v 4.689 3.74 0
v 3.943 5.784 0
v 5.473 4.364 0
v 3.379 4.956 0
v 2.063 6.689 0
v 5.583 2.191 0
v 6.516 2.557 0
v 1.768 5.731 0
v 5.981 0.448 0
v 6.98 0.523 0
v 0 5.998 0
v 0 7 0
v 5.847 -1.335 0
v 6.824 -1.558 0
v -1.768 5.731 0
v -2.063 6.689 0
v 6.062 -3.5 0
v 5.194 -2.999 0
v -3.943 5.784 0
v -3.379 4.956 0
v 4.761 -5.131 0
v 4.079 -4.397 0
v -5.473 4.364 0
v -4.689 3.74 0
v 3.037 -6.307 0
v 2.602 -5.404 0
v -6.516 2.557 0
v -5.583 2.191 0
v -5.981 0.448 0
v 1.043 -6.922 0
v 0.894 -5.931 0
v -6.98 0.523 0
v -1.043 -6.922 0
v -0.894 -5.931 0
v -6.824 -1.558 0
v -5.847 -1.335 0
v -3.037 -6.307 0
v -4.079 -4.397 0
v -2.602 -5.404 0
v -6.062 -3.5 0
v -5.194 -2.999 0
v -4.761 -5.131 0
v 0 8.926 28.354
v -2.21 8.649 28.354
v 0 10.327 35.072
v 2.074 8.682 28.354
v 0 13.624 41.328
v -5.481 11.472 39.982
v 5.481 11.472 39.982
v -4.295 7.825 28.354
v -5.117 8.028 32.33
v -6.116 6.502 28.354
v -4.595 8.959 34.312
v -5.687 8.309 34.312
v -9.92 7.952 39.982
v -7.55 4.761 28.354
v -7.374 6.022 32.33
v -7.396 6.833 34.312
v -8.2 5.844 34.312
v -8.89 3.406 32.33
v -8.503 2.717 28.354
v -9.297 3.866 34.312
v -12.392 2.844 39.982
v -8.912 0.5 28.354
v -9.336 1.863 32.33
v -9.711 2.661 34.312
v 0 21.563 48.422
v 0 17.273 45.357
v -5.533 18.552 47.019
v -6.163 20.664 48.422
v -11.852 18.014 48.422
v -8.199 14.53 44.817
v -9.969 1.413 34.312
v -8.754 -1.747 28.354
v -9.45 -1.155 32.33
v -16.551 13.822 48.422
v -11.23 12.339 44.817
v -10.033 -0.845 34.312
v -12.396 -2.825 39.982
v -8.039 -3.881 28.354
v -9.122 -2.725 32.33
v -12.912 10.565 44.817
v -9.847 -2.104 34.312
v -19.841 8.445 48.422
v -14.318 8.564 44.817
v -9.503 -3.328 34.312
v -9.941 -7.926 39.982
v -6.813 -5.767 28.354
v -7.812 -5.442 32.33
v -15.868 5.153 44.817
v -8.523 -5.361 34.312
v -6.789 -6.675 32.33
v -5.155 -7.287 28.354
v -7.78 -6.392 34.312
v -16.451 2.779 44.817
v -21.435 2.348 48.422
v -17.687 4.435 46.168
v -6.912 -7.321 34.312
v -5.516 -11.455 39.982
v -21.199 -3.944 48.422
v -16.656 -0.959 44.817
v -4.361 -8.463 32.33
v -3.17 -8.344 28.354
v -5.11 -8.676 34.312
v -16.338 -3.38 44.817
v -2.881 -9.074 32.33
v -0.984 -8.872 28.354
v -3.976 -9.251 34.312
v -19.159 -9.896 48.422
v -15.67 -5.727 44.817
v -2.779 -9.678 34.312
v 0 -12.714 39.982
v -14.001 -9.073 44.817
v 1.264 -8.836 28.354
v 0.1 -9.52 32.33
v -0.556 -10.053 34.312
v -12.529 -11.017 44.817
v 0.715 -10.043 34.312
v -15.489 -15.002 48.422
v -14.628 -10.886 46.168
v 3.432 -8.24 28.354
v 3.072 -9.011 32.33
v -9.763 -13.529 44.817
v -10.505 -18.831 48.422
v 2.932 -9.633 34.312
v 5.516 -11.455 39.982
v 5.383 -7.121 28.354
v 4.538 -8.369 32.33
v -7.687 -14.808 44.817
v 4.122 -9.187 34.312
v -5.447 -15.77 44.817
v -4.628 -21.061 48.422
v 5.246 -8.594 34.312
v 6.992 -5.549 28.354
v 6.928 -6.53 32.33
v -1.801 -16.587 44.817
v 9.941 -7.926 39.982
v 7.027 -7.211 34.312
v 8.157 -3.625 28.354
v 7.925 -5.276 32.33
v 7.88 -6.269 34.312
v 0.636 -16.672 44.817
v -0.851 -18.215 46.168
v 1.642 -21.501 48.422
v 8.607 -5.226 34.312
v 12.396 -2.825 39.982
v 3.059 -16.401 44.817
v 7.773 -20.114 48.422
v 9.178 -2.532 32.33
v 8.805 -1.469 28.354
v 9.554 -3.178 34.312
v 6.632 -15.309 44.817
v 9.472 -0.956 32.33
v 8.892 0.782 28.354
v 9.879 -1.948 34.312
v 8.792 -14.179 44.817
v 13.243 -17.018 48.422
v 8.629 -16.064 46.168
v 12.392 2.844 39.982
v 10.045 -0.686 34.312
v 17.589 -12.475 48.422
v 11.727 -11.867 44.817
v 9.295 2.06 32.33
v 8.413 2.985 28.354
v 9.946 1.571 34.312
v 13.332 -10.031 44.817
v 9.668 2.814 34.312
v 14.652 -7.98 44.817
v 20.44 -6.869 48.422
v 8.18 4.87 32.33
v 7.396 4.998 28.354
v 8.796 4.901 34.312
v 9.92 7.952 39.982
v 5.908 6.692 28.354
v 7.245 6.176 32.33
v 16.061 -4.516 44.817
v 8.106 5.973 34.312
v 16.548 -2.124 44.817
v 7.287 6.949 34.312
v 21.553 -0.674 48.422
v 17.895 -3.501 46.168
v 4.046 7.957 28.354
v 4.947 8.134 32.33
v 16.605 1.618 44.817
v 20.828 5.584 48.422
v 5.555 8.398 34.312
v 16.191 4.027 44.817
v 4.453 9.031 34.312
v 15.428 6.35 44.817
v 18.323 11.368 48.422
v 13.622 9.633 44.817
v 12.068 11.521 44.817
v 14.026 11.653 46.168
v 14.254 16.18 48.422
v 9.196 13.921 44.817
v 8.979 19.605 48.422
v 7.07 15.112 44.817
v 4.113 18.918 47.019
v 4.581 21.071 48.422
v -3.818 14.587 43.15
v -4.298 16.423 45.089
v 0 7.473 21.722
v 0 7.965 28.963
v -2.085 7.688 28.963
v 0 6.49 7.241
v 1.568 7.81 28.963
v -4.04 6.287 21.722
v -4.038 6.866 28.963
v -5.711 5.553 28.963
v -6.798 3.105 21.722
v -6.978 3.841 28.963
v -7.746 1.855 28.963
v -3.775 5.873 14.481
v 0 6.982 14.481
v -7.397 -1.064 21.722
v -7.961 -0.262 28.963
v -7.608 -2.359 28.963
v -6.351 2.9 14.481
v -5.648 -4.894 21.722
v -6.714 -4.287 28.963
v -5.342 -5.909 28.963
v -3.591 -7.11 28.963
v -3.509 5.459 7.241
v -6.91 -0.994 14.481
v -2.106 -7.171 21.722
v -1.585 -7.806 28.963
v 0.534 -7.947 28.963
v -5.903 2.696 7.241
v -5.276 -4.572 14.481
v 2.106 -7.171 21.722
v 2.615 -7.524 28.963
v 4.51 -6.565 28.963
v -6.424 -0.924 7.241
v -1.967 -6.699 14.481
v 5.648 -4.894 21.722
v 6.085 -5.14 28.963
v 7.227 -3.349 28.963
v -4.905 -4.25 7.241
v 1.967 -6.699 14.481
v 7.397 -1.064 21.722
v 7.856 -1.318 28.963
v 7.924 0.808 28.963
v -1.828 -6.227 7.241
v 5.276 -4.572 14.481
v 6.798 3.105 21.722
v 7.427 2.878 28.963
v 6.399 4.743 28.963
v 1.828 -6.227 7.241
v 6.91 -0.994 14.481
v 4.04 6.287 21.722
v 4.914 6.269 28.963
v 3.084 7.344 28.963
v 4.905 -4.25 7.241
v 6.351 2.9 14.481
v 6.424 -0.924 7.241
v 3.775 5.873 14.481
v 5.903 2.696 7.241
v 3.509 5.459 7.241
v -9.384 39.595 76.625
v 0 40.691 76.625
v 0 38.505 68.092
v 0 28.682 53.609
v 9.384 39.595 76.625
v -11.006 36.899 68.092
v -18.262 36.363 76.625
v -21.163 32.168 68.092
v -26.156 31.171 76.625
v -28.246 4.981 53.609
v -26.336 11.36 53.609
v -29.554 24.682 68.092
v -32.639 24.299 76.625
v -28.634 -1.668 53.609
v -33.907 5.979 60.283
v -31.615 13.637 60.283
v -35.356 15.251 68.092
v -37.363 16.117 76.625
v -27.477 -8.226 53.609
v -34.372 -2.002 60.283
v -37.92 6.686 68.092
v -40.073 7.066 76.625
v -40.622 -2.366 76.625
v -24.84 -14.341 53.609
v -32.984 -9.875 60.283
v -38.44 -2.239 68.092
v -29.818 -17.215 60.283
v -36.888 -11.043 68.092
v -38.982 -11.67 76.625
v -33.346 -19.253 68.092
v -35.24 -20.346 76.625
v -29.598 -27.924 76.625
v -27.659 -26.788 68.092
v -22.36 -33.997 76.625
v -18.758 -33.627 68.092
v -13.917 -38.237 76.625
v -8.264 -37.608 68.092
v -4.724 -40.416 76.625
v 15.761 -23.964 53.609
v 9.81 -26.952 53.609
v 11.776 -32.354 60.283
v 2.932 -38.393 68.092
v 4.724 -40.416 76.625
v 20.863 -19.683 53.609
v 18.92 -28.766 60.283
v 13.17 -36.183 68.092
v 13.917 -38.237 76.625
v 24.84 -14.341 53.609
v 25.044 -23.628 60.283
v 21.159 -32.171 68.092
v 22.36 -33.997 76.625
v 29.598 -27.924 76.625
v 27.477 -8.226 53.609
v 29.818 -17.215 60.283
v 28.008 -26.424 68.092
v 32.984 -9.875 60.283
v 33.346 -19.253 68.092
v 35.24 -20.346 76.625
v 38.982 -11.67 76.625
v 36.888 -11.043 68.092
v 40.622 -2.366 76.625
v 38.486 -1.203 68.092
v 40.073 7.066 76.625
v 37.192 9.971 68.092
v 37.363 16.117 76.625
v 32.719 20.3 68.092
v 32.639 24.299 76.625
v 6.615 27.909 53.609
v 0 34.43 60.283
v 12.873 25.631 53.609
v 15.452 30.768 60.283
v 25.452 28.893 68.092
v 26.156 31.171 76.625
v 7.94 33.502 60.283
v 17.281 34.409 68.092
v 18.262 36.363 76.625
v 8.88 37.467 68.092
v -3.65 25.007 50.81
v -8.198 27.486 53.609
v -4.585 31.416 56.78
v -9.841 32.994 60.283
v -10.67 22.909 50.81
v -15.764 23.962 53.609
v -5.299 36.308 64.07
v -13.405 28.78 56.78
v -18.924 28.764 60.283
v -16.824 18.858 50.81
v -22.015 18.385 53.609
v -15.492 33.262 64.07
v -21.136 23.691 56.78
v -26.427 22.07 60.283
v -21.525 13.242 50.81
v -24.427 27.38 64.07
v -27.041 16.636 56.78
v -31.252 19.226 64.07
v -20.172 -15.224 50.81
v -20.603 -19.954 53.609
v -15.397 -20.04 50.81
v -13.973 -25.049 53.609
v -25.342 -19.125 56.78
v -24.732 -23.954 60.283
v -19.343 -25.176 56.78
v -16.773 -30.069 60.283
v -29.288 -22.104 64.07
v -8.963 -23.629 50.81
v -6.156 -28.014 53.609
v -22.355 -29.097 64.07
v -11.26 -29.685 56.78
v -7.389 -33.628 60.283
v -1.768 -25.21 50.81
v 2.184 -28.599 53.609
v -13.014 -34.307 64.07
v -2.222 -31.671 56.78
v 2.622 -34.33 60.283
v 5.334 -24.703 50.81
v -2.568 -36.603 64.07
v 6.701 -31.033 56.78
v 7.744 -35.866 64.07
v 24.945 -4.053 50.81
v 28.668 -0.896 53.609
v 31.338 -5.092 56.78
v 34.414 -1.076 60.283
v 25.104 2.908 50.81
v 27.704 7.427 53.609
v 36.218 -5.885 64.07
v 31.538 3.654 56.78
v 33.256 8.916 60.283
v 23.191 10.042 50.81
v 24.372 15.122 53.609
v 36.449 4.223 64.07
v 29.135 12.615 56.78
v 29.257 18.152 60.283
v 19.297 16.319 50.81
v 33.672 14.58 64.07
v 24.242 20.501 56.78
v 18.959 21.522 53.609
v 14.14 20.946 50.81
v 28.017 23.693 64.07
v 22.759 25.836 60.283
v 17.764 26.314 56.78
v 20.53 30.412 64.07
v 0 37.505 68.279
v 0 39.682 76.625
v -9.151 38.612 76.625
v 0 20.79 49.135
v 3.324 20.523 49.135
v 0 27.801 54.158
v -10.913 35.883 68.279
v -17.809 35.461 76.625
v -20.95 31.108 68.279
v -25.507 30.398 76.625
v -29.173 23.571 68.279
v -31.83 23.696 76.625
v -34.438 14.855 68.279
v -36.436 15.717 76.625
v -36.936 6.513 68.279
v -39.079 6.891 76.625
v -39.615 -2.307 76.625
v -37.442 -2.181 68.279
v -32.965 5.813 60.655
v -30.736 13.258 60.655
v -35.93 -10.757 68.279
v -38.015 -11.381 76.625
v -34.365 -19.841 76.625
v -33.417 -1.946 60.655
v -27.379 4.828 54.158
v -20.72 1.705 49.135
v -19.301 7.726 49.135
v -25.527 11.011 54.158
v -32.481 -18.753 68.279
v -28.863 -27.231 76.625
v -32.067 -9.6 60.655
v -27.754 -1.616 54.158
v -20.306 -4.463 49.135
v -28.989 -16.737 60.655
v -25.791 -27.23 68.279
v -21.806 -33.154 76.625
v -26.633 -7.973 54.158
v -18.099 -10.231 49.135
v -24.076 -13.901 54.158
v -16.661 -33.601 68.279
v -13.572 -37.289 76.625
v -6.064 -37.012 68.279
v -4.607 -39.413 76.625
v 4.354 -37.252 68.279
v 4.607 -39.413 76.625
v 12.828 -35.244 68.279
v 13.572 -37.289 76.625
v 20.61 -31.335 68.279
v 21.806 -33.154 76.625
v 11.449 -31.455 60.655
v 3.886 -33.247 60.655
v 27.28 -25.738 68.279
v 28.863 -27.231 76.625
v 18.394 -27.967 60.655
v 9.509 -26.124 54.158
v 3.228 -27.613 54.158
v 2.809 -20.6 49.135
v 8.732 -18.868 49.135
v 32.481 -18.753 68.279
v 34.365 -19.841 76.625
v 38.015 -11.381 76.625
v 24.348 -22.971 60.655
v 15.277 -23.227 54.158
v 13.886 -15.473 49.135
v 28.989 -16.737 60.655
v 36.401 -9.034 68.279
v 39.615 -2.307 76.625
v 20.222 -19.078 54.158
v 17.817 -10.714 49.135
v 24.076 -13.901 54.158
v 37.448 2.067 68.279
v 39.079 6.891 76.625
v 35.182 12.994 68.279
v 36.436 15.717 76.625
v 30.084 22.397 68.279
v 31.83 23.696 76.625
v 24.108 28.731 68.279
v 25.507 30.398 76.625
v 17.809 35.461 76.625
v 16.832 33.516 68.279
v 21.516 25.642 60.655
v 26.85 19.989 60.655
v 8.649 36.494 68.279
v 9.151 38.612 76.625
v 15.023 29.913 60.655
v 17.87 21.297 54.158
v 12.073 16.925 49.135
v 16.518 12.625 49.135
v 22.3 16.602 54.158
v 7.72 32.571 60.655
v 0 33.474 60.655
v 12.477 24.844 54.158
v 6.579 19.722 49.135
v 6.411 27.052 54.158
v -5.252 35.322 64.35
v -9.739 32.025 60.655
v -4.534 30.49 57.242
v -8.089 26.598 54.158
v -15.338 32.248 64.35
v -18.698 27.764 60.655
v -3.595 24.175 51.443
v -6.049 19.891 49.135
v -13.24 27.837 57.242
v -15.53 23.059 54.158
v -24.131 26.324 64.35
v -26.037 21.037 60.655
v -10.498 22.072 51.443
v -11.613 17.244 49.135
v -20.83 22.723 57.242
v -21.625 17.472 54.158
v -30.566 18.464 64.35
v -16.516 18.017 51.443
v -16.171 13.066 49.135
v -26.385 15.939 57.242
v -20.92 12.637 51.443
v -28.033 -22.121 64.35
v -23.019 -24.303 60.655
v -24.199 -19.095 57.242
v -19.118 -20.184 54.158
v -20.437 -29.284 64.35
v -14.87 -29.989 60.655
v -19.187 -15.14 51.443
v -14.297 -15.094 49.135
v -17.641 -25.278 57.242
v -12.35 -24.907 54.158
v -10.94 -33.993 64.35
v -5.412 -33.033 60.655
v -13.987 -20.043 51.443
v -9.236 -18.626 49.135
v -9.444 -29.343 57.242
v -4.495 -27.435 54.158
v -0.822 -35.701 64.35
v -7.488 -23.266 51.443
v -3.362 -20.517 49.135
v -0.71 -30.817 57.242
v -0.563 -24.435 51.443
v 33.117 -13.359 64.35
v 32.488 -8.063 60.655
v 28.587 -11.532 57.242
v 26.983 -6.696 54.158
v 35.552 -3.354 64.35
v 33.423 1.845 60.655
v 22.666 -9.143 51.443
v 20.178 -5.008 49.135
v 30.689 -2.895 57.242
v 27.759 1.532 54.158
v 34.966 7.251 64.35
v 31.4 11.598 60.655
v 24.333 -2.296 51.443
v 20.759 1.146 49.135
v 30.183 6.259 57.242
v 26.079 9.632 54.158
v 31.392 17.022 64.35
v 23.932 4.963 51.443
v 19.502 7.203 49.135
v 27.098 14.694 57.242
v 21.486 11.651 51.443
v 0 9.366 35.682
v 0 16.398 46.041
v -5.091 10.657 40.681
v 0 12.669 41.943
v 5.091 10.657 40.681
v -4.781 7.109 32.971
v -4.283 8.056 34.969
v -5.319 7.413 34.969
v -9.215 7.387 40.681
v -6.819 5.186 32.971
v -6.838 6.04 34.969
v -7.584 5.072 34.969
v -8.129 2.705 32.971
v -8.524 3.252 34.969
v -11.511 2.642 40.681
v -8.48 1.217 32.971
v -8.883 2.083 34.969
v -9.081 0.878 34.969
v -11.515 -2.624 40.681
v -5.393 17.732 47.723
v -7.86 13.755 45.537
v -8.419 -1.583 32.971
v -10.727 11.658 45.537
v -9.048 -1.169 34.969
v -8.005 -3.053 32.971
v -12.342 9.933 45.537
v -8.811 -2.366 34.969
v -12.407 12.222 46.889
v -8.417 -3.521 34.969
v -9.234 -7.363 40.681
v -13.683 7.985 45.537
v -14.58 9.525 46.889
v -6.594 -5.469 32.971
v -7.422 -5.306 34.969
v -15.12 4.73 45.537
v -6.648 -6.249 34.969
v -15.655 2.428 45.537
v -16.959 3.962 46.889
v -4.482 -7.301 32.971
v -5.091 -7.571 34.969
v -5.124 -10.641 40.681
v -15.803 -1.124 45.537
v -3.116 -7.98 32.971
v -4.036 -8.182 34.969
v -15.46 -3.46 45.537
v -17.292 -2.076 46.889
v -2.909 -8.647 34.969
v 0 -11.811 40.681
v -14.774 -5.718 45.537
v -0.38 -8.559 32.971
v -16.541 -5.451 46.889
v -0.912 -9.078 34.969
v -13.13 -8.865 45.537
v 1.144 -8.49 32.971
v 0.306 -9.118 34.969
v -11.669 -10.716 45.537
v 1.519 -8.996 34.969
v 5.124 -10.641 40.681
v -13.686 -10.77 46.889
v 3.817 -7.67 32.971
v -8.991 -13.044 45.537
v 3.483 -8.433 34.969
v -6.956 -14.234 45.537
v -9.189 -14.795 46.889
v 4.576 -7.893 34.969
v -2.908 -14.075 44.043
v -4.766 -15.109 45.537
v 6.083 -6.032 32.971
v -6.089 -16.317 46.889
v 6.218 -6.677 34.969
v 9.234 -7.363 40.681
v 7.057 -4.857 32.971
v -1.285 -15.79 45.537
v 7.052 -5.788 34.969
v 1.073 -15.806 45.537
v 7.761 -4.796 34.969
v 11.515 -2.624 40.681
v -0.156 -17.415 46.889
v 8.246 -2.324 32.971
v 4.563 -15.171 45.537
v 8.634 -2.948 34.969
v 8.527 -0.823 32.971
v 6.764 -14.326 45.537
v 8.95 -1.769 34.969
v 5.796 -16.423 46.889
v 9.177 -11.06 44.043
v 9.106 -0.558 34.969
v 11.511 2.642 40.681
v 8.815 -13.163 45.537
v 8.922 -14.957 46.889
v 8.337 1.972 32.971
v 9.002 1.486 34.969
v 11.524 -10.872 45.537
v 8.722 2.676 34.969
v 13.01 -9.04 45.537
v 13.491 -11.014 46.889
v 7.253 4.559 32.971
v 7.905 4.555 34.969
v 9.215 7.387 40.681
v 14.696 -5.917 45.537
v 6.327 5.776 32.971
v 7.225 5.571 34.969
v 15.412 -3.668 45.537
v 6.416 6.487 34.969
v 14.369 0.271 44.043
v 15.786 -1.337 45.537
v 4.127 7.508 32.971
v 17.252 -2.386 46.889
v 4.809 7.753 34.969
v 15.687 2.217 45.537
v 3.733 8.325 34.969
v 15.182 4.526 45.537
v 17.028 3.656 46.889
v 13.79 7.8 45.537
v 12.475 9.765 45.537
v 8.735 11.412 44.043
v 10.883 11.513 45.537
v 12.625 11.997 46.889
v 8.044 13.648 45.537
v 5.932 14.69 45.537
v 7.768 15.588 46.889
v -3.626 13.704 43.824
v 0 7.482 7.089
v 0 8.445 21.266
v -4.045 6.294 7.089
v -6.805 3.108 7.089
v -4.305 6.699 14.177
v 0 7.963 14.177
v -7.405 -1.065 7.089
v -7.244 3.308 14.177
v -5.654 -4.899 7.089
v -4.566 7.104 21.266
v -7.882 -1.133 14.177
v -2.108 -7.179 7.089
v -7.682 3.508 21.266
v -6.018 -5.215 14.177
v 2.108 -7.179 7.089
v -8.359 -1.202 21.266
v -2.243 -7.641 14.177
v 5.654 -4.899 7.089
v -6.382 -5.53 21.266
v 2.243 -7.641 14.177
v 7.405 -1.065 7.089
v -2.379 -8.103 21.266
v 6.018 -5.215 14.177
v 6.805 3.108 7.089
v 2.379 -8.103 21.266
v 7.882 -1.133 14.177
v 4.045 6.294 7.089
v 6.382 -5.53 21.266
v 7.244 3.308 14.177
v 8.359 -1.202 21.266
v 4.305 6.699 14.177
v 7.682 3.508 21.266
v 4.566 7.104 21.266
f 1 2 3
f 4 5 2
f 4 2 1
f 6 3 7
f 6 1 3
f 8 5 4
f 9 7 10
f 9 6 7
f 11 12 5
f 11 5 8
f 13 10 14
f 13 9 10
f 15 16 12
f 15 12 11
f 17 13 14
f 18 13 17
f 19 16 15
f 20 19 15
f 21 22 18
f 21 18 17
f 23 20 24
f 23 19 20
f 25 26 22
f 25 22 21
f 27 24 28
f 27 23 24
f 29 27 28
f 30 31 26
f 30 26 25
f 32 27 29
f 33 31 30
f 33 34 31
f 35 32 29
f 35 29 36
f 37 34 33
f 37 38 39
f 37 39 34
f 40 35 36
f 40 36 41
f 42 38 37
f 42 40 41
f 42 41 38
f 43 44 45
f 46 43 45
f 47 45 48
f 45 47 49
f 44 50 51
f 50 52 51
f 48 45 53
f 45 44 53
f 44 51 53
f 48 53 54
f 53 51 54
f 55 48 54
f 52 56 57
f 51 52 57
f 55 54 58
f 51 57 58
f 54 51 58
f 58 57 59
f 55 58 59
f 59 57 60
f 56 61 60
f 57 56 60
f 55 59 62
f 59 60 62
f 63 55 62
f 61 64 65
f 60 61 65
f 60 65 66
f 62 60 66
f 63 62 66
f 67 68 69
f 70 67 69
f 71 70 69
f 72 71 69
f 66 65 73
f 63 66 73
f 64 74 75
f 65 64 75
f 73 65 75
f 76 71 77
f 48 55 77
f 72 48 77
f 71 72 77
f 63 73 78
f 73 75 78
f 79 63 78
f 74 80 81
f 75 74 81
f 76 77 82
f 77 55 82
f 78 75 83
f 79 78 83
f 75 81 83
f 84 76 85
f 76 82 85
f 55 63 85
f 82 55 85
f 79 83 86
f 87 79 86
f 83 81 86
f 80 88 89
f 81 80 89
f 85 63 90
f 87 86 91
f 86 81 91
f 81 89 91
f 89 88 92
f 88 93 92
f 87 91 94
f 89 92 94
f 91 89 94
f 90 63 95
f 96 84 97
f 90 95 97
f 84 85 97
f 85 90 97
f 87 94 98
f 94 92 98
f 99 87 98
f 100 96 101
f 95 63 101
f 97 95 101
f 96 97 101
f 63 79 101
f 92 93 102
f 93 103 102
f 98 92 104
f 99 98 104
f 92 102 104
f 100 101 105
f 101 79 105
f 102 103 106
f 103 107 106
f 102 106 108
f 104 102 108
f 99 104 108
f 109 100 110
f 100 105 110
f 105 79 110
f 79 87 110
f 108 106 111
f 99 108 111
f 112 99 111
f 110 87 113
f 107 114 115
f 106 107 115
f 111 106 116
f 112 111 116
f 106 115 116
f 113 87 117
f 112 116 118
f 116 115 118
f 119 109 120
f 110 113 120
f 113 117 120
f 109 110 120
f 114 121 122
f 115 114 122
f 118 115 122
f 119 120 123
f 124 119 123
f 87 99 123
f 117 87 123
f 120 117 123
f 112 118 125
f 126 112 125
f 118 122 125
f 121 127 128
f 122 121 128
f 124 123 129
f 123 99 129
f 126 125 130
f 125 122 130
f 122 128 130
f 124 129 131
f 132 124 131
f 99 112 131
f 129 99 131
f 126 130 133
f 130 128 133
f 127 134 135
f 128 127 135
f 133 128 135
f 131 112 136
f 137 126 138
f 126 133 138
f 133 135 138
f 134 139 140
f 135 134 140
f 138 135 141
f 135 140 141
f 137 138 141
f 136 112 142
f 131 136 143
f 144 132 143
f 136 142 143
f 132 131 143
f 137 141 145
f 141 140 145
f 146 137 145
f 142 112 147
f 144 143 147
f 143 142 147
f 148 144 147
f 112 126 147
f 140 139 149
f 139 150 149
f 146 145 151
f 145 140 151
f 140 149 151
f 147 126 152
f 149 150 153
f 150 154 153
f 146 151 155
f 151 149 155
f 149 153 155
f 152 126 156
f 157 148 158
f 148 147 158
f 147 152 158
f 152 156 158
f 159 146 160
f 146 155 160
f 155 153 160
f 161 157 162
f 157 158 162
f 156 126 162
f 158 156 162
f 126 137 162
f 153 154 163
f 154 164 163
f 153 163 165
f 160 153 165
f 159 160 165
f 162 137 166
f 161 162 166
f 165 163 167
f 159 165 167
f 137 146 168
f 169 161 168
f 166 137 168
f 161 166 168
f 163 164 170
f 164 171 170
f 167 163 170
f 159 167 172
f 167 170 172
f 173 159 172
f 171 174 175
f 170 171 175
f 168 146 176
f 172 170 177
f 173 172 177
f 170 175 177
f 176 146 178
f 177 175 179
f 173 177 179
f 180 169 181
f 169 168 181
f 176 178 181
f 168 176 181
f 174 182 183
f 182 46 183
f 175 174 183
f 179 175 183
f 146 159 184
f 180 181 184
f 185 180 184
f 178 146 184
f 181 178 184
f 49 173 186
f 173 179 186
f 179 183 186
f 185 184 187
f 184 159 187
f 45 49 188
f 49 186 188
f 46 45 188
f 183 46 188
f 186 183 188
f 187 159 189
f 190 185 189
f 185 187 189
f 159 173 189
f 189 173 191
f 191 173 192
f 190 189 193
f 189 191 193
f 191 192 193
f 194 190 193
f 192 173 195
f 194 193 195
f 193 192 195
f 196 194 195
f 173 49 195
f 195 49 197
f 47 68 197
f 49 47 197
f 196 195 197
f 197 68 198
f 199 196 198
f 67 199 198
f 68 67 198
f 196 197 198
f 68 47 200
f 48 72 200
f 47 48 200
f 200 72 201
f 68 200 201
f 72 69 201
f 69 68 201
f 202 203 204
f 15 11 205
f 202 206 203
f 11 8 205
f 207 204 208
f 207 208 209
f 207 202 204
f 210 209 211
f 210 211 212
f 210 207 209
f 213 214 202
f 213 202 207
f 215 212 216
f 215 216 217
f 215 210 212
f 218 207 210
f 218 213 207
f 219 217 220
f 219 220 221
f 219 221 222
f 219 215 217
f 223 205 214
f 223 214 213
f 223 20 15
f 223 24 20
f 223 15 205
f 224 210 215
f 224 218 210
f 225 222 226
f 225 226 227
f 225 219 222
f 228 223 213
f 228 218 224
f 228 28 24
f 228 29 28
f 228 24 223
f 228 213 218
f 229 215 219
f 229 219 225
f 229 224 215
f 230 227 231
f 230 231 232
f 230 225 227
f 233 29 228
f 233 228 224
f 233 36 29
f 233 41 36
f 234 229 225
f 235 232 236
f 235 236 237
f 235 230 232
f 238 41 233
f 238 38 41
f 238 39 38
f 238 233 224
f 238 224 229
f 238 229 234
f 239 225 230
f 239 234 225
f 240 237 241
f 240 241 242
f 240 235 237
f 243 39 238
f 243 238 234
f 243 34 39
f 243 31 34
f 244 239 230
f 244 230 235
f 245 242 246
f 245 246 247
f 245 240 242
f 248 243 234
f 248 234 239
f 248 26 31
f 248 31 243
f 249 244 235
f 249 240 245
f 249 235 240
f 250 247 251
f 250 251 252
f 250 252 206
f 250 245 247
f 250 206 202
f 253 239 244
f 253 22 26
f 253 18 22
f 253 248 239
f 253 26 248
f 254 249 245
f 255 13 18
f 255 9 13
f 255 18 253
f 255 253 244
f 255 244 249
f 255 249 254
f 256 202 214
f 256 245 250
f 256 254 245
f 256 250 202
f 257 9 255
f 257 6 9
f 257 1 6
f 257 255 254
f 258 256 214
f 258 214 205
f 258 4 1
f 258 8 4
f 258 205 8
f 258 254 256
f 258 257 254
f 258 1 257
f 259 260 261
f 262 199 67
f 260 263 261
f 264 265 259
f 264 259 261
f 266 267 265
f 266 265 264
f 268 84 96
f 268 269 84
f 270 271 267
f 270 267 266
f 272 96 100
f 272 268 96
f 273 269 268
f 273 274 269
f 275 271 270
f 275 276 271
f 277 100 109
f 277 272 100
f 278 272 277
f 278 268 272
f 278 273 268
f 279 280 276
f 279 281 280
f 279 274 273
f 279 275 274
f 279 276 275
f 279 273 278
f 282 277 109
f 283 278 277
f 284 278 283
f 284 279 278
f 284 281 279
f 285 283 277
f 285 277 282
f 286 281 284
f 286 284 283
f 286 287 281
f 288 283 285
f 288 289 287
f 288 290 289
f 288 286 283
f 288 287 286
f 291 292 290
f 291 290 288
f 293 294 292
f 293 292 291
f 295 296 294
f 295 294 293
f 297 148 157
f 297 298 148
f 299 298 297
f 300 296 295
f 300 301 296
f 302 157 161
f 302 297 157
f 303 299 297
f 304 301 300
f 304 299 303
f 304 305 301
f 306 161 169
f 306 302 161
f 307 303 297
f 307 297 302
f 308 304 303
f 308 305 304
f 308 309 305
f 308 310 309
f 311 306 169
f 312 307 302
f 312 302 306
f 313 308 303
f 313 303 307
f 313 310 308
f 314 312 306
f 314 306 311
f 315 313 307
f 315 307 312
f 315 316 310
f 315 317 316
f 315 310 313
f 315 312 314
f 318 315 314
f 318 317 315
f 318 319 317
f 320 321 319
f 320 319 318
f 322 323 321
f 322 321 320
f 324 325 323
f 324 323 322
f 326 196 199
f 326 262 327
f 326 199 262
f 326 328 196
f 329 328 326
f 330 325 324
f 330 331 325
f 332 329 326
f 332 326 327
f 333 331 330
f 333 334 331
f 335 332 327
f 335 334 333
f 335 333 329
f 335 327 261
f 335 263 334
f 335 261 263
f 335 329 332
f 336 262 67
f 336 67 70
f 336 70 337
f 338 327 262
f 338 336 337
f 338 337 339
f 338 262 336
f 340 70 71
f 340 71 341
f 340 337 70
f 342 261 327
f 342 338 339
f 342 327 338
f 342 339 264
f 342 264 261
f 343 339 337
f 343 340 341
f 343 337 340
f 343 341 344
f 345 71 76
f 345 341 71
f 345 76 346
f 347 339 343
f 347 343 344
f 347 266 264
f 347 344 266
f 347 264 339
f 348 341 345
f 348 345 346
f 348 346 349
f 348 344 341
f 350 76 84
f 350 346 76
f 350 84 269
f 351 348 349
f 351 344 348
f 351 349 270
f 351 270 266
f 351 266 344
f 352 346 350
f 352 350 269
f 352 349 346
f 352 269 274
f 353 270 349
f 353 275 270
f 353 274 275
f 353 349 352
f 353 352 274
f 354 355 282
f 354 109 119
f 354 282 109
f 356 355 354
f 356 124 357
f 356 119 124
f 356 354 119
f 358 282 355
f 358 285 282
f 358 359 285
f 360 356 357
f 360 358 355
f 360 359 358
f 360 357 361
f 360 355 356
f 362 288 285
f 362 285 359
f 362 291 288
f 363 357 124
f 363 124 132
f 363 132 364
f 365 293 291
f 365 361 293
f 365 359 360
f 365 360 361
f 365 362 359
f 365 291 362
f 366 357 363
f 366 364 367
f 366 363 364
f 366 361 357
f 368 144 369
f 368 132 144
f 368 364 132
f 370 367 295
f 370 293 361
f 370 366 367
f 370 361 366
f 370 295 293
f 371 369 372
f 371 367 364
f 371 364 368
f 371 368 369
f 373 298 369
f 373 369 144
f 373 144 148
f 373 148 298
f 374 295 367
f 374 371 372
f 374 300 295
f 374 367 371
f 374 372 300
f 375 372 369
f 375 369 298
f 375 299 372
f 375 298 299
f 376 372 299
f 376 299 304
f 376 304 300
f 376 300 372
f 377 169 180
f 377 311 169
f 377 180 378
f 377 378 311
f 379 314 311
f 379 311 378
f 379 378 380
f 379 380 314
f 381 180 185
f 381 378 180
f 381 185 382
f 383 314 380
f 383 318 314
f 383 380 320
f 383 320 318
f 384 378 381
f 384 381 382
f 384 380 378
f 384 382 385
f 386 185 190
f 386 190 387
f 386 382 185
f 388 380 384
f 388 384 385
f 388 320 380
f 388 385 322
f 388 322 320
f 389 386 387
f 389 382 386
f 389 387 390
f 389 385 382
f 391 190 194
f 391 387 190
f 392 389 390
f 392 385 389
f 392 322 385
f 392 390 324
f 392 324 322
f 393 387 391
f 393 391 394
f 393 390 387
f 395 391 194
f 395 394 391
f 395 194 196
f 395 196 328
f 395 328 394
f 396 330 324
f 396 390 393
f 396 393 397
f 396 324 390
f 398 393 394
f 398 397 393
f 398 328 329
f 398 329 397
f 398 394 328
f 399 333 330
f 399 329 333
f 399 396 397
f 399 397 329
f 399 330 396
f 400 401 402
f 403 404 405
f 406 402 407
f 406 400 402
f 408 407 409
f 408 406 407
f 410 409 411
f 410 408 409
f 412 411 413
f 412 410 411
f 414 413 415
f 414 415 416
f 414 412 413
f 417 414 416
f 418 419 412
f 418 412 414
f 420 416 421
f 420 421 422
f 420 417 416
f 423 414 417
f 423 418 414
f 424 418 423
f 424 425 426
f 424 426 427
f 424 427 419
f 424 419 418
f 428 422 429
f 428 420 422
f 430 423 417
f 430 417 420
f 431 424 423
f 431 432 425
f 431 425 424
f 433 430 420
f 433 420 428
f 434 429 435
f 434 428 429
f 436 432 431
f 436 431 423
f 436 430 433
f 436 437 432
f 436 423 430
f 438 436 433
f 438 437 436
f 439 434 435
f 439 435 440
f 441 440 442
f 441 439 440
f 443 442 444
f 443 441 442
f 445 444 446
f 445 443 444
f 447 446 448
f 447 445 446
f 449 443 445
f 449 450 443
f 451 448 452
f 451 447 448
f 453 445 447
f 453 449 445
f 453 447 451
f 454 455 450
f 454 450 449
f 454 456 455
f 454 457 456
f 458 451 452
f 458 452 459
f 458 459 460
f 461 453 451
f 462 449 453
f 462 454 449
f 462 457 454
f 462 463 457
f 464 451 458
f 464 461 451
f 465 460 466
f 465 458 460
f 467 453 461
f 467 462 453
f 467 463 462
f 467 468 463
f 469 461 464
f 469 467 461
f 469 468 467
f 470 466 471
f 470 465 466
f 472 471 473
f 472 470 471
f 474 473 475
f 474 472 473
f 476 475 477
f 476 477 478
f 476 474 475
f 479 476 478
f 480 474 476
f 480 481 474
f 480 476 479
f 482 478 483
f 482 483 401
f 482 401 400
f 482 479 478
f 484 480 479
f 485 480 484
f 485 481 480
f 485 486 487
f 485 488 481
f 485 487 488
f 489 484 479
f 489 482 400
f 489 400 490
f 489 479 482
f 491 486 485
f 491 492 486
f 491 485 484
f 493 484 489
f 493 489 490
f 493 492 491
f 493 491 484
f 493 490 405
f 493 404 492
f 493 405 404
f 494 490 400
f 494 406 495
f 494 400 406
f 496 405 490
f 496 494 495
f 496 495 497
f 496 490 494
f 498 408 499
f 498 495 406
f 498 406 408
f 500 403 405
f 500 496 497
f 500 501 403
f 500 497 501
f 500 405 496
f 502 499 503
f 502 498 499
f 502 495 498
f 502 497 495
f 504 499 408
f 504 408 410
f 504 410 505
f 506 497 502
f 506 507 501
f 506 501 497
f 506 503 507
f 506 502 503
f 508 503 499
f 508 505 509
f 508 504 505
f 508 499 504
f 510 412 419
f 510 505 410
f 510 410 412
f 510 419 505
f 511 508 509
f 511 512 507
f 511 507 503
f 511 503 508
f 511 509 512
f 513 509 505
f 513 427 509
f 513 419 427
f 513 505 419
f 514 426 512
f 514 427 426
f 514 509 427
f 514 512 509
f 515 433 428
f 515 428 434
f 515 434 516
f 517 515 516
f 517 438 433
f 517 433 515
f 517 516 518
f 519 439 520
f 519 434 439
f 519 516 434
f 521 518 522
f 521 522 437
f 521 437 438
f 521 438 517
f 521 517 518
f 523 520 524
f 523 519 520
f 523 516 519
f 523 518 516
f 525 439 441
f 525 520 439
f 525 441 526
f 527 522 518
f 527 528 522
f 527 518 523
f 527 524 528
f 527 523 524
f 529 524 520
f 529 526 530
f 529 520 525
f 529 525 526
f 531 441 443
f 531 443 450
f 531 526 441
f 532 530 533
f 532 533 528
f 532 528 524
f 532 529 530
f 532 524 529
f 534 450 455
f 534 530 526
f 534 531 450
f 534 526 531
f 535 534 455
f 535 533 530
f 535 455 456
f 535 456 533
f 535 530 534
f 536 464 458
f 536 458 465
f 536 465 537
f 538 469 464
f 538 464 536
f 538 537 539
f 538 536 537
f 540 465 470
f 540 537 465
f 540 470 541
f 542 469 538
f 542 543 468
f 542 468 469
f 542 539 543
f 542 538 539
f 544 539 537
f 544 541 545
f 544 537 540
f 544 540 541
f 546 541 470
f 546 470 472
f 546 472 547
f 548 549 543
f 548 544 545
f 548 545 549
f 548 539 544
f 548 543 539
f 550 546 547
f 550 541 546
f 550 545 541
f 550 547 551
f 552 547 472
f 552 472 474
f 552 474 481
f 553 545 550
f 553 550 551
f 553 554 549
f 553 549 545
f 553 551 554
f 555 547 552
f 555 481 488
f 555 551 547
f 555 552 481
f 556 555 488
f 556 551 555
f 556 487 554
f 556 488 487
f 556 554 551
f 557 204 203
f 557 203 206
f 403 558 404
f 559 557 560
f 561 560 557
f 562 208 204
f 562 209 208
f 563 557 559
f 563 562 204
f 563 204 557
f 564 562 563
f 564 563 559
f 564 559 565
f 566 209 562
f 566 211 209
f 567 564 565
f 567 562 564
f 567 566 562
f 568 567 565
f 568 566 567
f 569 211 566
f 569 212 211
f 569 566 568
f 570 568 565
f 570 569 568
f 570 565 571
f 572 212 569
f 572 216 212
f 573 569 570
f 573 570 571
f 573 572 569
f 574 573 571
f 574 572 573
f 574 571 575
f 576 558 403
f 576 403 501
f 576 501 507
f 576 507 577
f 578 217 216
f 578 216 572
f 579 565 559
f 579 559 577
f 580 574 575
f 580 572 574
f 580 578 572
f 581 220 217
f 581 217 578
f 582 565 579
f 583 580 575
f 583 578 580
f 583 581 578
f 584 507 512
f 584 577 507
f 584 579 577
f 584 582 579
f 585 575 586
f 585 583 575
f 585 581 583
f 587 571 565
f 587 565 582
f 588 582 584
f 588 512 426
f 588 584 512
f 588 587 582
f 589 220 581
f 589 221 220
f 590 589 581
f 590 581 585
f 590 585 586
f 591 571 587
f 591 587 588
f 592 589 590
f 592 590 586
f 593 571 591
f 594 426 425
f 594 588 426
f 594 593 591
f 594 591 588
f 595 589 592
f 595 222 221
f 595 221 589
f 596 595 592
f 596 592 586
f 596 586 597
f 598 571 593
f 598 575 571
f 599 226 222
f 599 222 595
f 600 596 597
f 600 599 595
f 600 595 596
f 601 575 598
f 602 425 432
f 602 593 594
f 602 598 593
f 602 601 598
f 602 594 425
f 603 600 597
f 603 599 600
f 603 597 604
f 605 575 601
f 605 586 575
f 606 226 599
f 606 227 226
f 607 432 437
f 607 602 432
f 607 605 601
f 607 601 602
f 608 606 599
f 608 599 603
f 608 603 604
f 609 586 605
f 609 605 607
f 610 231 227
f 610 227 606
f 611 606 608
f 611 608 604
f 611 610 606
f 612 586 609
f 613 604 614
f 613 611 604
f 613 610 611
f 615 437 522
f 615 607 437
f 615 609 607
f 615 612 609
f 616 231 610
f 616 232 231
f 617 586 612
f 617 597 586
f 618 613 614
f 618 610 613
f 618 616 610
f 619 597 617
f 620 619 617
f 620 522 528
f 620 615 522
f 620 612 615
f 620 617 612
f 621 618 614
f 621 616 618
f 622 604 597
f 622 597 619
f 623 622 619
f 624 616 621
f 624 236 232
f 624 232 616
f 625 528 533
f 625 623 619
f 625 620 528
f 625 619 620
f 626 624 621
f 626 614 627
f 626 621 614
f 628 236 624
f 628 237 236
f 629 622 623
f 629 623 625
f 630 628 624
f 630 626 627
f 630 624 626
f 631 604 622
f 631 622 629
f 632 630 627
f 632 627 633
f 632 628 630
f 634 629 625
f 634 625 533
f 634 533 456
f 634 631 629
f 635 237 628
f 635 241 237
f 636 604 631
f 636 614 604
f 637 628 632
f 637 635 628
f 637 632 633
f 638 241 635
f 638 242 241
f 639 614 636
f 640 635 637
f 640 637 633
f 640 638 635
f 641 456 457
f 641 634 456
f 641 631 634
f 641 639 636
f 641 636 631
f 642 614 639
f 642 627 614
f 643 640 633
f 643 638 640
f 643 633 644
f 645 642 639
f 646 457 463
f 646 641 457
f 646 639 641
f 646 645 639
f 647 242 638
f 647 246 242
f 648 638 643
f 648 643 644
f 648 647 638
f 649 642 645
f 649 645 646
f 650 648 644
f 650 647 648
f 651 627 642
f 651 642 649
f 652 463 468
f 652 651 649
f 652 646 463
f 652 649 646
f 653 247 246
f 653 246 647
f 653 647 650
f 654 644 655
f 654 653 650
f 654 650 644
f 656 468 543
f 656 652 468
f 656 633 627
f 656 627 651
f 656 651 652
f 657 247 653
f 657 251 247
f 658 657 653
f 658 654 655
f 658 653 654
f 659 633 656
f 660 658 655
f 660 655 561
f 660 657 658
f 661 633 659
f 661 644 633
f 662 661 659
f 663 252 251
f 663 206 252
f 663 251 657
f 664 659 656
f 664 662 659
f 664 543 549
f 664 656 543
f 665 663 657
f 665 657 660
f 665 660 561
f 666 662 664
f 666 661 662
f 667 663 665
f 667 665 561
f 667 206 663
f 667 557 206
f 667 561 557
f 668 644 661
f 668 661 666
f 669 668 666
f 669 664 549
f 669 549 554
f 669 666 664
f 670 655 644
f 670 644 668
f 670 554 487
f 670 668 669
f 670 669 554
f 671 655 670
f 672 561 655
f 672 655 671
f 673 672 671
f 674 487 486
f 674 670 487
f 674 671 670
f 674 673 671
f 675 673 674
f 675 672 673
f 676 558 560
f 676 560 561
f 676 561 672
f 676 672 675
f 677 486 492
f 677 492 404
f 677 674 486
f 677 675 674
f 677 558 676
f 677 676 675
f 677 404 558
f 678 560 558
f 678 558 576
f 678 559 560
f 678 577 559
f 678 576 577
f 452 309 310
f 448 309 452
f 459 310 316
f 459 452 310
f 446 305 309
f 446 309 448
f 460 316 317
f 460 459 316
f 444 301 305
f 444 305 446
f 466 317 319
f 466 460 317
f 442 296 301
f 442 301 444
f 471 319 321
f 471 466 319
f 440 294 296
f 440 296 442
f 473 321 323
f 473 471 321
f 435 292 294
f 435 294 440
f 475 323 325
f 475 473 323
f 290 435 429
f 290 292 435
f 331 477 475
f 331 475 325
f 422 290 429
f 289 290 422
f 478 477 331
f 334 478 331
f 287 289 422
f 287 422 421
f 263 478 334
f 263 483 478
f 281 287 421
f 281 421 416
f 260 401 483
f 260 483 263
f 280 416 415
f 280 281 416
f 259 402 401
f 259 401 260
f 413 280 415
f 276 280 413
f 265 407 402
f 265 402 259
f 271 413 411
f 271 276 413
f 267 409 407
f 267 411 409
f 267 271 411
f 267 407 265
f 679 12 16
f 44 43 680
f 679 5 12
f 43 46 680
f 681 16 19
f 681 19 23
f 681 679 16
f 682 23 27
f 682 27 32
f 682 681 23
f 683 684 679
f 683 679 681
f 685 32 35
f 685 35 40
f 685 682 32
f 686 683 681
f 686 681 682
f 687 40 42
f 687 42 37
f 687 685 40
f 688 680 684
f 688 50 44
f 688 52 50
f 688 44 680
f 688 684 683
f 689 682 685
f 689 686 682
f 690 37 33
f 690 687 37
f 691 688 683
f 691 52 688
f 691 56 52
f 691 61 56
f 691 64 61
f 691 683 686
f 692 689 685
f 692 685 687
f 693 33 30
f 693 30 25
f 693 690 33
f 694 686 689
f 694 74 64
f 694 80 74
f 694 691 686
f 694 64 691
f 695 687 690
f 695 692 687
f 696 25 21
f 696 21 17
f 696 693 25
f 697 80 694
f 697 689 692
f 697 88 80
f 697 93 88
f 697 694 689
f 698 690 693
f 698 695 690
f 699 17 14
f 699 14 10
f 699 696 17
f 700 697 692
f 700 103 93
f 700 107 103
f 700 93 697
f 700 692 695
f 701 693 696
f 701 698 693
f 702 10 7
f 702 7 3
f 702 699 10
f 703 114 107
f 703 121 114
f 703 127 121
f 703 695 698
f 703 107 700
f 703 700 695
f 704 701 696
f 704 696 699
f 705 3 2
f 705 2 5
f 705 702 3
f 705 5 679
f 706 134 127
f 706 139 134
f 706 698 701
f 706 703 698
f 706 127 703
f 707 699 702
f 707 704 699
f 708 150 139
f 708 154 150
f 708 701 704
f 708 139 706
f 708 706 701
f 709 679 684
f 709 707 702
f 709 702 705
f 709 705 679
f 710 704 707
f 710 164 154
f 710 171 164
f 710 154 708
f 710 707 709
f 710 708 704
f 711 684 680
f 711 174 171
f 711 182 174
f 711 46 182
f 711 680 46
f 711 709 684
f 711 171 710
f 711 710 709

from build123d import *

# Parameters (mm, degrees)
F2_R = 25


with BuildPart() as f1:
    # F0 (on Right) → F1 (revolve)
    with BuildSketch(Plane.YZ):
        with BuildLine():
            Line((9.054969, 45), (5.997695, 0))
            Line((5.997695, 0), (7, 0))
            Line((7, 0), (10, 44.156982))
            ThreePointArc((10, 44.156982), (30.559322, 55.462497), (40.691342, 76.624788))
            Line((40.691342, 76.624788), (39.681802, 76.624788))
            ThreePointArc((39.681802, 76.624788), (29.520313, 55.823041), (9.054969, 45))
        make_face()
    revolve(axis=Axis((0, 0, 37.277609), (0, 0, 1)))

    # F2
    f2_edges = [f1.edges().sort_by_distance(p)[0] for p in [
        (0, -10, 44.156982),
        (0, -9.054969, 45),
    ]]
    fillet(f2_edges, radius=F2_R)


solid = f1.part
